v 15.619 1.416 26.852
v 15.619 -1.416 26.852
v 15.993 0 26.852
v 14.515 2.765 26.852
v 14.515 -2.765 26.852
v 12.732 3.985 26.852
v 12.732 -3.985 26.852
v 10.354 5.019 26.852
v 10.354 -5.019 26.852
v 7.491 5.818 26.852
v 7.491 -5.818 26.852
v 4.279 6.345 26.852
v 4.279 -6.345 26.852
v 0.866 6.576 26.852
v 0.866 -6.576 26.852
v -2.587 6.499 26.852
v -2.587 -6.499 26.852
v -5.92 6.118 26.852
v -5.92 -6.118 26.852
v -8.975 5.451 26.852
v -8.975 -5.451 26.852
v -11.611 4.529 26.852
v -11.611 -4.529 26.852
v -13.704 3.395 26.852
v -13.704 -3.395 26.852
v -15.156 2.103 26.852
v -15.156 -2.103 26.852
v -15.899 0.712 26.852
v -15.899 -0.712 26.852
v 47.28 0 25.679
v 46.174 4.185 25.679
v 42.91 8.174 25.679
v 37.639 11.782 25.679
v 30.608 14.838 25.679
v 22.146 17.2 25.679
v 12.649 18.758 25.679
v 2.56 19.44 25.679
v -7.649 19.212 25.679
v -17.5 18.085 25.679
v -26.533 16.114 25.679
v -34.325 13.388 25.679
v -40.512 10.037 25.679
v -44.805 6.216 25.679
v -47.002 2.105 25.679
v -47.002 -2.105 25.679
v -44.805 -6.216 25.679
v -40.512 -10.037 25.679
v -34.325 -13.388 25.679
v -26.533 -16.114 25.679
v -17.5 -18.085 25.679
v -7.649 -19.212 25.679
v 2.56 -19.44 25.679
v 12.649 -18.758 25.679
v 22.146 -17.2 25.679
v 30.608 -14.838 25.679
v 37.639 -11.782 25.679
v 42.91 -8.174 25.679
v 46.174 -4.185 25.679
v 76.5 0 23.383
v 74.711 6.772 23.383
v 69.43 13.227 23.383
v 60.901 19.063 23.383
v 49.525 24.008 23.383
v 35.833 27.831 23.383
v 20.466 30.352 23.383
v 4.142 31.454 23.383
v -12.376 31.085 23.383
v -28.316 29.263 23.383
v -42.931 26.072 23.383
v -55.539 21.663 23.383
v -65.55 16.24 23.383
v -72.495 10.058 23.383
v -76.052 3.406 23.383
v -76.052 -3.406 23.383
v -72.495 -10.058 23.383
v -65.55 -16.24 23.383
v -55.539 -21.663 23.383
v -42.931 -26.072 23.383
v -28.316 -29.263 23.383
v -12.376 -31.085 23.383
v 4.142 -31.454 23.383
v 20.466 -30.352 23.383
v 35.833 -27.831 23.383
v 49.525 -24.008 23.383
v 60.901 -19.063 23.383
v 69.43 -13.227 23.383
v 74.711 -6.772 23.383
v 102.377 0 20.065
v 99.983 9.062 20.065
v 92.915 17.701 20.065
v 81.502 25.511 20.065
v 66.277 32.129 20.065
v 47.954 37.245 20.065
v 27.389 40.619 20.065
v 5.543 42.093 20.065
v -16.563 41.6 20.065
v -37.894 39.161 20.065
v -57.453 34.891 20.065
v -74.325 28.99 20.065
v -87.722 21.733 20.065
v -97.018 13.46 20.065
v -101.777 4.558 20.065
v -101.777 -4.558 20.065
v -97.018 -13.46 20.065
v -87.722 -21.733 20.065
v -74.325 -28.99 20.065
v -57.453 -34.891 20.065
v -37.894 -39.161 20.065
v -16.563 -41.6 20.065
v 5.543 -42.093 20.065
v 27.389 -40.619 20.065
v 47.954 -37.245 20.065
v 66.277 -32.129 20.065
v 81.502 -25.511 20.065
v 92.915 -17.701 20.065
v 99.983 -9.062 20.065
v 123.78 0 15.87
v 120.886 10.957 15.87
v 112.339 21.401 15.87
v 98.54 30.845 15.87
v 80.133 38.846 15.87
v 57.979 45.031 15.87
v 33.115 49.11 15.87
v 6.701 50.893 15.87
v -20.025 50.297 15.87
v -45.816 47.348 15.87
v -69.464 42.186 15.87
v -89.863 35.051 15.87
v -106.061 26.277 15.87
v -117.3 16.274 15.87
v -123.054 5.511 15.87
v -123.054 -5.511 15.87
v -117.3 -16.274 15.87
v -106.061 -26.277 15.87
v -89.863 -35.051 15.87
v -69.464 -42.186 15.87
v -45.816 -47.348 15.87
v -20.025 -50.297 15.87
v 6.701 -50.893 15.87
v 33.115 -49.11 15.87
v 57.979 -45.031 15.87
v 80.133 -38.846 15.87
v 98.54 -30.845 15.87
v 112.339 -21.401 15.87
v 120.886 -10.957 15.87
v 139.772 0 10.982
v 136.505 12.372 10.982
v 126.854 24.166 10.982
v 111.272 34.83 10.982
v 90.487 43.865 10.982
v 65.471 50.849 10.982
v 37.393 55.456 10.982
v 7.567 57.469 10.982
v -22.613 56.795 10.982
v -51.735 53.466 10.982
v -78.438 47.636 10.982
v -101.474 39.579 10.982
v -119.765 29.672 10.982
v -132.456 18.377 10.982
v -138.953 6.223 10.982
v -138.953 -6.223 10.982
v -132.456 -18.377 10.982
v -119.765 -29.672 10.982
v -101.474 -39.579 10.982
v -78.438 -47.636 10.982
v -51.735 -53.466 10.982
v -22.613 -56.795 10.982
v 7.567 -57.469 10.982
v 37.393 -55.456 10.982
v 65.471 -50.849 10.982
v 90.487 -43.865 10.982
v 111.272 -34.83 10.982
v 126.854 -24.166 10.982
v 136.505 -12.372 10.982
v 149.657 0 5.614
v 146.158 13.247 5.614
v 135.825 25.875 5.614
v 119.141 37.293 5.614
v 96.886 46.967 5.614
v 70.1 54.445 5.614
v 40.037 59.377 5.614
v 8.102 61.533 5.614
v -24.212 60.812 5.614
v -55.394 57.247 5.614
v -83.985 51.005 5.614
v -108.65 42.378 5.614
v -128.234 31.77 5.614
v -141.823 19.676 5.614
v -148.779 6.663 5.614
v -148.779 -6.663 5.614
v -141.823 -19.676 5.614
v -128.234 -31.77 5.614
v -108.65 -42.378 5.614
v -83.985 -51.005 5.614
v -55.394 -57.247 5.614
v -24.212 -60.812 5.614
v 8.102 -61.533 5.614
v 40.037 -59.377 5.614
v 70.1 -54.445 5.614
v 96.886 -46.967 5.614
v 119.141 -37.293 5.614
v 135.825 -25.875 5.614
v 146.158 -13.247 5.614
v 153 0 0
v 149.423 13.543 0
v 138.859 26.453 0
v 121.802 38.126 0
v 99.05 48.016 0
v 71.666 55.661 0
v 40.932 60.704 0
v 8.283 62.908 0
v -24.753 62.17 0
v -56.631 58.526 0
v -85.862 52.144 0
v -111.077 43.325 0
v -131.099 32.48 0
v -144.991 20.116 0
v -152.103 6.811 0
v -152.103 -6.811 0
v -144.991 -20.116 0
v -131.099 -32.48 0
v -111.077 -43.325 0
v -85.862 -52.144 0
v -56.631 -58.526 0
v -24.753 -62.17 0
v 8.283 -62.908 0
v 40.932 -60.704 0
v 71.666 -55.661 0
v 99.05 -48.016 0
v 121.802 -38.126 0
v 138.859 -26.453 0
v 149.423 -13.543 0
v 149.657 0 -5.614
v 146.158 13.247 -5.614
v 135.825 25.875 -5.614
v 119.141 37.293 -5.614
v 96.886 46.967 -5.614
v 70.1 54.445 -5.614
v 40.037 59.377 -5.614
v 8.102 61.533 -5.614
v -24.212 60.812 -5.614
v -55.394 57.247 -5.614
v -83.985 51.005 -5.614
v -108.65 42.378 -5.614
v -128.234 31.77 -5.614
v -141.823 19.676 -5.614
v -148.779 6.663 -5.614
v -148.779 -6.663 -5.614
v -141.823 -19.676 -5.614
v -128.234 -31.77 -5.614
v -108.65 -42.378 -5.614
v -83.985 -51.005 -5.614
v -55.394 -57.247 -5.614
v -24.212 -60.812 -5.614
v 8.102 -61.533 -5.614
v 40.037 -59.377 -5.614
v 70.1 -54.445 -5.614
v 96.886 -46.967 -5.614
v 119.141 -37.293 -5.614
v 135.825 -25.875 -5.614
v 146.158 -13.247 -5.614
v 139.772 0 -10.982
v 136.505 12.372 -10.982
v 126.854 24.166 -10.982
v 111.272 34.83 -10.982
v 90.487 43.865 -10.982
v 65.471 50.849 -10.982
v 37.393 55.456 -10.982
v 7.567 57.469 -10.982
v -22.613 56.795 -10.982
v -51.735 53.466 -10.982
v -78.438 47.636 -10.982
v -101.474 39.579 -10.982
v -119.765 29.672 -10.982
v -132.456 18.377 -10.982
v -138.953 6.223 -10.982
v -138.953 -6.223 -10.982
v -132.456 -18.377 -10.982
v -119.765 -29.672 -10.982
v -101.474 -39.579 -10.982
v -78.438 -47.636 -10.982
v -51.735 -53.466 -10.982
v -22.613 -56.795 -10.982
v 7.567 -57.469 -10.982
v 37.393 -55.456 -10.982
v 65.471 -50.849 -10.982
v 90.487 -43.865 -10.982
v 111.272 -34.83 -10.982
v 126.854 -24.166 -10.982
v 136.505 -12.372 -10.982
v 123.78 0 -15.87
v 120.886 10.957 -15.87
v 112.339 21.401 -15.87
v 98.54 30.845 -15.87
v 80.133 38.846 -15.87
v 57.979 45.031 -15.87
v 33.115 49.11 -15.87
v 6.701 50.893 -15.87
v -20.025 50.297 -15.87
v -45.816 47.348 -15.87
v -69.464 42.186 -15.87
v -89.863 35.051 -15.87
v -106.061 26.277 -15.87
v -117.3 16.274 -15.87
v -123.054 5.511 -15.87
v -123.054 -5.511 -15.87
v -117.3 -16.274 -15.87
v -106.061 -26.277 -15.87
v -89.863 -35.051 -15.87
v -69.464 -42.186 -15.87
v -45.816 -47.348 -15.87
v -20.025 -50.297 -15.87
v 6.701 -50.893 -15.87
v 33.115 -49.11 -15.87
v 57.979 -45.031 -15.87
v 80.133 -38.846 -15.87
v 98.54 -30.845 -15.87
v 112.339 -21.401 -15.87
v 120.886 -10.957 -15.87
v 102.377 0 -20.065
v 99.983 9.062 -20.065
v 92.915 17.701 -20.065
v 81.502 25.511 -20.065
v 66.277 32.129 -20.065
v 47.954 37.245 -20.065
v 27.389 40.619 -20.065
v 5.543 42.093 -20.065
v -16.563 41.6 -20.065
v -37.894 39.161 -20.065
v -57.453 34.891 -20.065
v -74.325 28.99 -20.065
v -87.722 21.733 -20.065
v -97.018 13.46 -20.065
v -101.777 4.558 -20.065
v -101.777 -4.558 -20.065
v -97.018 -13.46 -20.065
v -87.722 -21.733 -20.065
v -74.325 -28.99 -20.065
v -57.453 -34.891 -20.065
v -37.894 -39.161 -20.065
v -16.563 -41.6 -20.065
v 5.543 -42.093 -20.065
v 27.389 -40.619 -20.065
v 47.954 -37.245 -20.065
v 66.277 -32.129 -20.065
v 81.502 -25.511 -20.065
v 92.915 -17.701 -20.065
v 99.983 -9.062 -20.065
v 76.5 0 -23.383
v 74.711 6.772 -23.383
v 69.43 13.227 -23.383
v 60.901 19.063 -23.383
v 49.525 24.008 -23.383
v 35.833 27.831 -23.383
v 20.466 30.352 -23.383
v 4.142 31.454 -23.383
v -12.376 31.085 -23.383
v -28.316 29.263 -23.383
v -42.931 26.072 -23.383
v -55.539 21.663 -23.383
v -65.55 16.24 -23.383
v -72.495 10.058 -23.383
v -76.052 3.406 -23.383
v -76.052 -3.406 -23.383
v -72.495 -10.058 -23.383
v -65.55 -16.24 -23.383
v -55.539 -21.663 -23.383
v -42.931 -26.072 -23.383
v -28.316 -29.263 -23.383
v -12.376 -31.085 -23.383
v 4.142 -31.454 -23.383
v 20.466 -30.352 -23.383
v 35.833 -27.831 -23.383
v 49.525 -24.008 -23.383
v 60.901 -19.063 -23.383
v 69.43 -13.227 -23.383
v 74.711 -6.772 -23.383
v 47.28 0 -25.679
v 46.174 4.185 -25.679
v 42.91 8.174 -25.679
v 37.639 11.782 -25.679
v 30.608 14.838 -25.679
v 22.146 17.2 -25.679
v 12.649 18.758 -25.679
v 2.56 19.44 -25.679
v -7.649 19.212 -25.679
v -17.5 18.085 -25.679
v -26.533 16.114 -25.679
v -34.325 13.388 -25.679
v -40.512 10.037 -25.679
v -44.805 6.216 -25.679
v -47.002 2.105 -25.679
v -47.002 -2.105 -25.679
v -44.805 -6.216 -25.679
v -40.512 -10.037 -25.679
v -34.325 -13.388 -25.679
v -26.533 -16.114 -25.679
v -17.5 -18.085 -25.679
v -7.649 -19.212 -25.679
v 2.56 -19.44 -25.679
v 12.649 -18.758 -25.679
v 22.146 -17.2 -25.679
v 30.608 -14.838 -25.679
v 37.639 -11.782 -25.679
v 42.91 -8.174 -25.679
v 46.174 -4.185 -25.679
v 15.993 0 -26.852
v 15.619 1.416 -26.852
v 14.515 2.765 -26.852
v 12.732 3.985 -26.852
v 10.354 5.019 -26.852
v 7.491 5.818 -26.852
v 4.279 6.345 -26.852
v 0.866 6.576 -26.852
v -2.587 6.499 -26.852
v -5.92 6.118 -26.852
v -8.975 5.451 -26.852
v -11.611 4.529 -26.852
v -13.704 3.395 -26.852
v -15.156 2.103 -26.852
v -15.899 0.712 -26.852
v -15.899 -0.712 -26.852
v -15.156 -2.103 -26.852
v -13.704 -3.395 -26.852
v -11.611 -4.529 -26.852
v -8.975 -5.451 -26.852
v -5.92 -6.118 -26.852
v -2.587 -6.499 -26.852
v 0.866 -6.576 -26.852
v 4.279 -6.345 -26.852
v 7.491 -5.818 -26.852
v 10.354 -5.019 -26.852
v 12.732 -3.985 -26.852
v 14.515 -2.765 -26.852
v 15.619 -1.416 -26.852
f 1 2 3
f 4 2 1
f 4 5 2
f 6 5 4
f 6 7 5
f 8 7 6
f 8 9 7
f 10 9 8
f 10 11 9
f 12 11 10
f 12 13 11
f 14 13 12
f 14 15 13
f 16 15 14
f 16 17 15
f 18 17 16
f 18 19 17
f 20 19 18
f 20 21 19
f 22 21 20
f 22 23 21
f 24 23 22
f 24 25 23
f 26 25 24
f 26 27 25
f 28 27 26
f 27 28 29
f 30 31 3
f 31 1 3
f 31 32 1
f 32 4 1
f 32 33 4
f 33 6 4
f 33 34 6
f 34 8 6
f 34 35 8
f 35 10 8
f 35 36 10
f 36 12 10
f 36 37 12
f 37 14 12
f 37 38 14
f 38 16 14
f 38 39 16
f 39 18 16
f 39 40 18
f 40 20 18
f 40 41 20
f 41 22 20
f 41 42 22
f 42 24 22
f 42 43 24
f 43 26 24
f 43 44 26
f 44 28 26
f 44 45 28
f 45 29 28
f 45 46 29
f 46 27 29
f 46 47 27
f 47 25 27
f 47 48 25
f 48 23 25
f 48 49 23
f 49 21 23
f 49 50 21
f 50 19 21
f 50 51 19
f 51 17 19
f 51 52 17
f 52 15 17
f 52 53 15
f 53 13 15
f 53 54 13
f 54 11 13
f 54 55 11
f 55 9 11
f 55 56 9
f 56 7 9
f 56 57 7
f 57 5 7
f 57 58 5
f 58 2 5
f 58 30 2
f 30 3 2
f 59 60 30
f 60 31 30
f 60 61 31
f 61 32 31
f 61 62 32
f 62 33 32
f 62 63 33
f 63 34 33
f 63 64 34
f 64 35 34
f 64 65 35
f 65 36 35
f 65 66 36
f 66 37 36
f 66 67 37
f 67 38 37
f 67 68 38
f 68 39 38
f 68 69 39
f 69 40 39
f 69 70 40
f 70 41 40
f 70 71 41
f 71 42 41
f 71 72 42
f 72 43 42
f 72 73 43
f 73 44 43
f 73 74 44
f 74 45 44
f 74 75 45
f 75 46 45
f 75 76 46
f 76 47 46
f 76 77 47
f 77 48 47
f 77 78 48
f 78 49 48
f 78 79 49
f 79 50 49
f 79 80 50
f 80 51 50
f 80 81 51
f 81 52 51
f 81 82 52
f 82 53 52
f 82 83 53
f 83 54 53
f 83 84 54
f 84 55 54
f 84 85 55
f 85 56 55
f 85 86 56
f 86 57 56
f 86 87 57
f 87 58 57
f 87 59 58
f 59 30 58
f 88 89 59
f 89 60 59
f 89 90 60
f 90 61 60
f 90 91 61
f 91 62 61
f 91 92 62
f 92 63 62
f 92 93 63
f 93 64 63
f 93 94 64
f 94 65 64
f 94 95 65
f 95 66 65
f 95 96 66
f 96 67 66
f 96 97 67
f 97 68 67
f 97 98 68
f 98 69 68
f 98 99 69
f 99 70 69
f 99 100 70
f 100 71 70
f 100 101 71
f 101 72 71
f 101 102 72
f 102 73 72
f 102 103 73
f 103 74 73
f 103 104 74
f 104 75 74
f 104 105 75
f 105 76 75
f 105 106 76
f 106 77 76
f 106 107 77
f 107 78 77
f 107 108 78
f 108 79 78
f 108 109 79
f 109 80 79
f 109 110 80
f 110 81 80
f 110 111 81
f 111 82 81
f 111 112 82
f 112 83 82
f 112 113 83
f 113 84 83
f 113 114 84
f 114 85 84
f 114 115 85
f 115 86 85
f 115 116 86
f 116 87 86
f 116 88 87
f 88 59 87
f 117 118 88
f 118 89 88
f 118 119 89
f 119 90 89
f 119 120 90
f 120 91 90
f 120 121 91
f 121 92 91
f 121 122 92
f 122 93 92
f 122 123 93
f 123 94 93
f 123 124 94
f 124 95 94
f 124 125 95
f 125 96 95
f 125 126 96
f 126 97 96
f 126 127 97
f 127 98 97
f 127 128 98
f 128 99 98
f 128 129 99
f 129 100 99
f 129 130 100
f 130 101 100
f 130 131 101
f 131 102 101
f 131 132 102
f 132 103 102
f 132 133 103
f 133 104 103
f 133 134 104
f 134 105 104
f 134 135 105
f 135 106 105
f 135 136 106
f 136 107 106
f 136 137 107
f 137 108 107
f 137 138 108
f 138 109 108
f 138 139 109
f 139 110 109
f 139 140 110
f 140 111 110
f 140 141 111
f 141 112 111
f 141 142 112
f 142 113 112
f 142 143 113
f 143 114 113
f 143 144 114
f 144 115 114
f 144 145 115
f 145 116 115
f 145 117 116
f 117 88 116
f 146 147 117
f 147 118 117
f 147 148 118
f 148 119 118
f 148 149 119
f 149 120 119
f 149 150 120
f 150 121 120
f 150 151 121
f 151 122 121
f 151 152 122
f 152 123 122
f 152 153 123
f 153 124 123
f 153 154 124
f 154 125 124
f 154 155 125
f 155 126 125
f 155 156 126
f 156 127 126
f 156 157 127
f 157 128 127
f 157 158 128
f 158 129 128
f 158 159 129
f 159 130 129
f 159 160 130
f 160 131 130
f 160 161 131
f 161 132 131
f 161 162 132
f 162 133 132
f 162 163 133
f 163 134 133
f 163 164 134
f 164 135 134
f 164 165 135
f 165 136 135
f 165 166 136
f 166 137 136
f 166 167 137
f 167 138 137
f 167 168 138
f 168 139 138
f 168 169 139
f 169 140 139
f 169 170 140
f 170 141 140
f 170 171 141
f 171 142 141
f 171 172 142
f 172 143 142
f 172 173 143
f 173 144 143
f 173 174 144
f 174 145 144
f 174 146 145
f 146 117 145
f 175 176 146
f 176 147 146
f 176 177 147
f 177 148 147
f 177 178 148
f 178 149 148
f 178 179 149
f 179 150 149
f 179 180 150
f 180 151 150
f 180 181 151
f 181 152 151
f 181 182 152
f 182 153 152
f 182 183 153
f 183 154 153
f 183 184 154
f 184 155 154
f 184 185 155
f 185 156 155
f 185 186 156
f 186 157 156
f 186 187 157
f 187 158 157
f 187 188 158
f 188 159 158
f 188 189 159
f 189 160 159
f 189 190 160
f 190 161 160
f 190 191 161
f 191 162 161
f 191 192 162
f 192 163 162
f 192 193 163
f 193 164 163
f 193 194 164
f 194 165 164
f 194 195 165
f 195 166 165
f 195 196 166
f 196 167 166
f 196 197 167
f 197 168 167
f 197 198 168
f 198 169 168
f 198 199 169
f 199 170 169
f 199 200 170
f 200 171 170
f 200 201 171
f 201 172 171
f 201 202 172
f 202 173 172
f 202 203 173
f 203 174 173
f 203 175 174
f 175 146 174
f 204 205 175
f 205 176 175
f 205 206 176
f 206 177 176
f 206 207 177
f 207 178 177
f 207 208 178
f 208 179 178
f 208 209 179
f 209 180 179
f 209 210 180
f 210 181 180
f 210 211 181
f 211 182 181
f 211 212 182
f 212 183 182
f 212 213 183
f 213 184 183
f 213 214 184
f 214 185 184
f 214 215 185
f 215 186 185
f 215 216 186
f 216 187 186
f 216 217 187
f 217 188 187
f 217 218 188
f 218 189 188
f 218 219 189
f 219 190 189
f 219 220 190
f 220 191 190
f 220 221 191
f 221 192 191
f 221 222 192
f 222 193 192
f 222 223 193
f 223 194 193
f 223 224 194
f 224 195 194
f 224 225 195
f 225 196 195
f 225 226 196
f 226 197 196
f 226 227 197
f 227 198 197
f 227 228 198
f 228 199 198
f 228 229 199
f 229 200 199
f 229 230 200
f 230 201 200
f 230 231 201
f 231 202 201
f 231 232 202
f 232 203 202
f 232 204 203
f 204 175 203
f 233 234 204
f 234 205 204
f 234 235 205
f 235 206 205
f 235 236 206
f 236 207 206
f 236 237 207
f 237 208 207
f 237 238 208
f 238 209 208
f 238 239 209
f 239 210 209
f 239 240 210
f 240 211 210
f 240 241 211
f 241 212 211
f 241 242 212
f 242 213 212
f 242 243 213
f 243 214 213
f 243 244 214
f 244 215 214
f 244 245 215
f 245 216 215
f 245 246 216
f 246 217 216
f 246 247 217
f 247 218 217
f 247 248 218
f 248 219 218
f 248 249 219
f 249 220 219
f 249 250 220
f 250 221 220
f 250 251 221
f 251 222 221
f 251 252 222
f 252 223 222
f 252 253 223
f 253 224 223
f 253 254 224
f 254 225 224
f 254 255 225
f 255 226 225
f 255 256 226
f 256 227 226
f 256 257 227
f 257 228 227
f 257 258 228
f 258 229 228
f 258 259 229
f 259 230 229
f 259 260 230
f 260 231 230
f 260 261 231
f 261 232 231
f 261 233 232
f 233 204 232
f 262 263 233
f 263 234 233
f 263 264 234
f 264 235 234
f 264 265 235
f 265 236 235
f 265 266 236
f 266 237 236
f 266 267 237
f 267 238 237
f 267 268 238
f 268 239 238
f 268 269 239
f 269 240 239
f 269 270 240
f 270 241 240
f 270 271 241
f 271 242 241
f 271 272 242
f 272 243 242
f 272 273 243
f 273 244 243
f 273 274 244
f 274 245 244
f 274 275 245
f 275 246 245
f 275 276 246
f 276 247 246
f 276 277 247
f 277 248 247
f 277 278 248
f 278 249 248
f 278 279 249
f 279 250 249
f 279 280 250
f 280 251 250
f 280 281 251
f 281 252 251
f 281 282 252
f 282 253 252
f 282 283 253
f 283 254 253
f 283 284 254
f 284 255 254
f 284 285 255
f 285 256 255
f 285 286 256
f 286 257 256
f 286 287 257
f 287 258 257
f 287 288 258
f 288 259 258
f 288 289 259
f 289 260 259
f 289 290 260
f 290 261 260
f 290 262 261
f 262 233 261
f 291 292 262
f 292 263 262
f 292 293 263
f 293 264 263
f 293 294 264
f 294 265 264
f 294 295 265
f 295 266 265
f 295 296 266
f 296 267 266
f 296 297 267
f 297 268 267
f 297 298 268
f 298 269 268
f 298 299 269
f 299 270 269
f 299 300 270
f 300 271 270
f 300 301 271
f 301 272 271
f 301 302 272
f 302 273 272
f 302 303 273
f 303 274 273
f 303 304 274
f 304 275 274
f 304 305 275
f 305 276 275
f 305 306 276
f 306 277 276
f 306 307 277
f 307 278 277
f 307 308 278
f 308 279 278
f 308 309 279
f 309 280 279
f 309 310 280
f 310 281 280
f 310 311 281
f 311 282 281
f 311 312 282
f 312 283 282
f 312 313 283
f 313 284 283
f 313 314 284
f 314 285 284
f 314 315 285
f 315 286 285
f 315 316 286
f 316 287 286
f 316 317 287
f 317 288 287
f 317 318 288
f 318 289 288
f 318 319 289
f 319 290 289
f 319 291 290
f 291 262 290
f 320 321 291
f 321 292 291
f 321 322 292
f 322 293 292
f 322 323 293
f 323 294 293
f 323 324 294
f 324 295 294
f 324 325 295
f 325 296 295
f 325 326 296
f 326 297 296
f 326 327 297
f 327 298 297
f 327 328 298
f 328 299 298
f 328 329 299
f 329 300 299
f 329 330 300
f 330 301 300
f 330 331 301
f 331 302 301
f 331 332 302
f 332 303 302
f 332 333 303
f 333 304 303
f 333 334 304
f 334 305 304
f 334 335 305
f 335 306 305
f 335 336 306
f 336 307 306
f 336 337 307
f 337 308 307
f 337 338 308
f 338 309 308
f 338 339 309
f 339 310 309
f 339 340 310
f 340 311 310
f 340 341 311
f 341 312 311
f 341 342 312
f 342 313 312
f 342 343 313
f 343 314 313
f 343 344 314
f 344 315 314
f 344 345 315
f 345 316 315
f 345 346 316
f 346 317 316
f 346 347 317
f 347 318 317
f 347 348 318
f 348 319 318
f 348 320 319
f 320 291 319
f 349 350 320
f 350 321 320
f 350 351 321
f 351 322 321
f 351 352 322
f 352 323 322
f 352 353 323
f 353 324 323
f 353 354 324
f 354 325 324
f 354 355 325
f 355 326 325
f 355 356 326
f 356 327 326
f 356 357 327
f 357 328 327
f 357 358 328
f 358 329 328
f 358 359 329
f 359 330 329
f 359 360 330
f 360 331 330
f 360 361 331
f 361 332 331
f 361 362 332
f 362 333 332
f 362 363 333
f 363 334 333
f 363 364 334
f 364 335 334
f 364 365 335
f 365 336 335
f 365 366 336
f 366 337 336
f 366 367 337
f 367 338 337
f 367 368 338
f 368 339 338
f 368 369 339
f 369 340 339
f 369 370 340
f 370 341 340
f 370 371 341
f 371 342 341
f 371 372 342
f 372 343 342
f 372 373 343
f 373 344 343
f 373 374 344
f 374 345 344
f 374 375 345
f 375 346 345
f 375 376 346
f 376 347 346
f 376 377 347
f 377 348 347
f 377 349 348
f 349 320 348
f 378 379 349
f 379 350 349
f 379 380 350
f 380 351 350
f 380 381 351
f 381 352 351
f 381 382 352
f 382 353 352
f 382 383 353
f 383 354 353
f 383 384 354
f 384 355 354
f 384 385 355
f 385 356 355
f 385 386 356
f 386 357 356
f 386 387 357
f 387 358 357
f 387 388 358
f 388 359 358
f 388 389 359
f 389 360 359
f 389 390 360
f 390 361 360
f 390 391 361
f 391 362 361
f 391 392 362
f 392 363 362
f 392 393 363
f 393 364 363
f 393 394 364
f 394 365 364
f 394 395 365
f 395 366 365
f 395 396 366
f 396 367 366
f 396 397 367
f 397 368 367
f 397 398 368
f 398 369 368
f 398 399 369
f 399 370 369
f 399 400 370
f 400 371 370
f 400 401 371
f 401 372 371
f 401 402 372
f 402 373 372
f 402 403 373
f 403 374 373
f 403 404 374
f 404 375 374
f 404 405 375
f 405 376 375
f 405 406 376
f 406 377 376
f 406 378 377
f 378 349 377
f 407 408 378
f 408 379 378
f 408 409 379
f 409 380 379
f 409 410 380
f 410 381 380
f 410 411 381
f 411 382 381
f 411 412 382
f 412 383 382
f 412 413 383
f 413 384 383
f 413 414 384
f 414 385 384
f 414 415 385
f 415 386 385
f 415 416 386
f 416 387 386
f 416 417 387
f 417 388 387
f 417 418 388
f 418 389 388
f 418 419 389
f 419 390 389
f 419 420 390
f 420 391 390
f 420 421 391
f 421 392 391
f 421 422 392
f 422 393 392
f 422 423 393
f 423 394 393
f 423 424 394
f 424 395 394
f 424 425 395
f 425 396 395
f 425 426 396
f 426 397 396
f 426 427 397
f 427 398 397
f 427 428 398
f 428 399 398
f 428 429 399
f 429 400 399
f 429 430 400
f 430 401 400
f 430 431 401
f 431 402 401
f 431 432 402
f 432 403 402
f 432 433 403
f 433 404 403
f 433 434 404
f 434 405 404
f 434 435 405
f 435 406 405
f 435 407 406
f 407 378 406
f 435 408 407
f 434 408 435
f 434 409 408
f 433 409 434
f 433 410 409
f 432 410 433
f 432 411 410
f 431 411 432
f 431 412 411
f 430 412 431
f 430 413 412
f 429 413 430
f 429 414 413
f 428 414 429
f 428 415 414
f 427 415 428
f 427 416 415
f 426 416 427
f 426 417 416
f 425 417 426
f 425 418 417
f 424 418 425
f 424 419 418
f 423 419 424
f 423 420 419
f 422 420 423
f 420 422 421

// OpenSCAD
// Generated by SolidPython 1.0.1 on 2020-07-29 00:46:52


scale(v = [17, 7, 3]) {
	sphere(r = 9);
}
/***********************************************
*********      SolidPython code:      **********
************************************************
 
# import packages: SolidPython
from solid import *
from solid.utils import *
from itertools import chain, combinations, permutations


class Resize:

    def __init__(self, scad_file):
        self.scad_file = scad_file
        #self.scad_file = import_scad(scad_file)
        # cone/cylinder param:
        self.r1 = 0
        self.r2 = 0
        self.h = 0
        # rectangular prism param:
        self.w = 0
        self.l = 0
        # ellipse param:
        self.r = 0

    # import OpenScad code (file name corresponds to shape)


    # classify shape + parameters
    def assign(self, param1, param2, param3):
        if self.scad_file == 'cone.scad':
            self.r1 = param1
            self.r2 = param2
            self.h = param3
        elif self.scad_file == 'cylinder.scad':
            self.r1 = param1
            self.r2 = param2
            self.h = param3
        elif self.scad_file == 'rectangularPrism.scad':
            self.h = param1
            self.l = param2
            self.w = param3
        else:
            self.r = param1
            self.h = param2

    # resize parameters
    def iterate(self):
        x = range(3, 20, 2)
        i = 1
        if self.scad_file == 'cone.scad':
            tempList = list(permutations(x, 2))
            for temp in tempList:
                param1 = temp[0]
                param2 = temp[1]
                filepath = 'produced_scad_files/' + 'cone' + str(param1) + '_' + str(param2) + '_' + '.scad'
                scad_render_to_file(cylinder(h=param1, r1=param2, r2=0), filepath)

        elif self.scad_file == 'cylinder.scad':
            tempList = list(permutations(x, 3))
            for temp in tempList:
                param1 = temp[0]
                param2 = temp[1]
                filepath = 'produced_scad_files/' + 'cylinder' + str(param1) + '_' + str(param2) + '_' + '.scad'
                scad_render_to_file(cylinder(h=param1, r1=param2, r2=param2), filepath)

        elif self.scad_file == 'rectangularPrism.scad':
            tempList = list(permutations(x, 3))
            for temp in tempList:
                param1 = temp[0]
                param2 = temp[1]
                param3 = temp[2]
                filepath = 'produced_scad_files/' + 'rectangularPrism' + str(param1) + '_' + str(param2) + '_' + str(
                    param3) + '.scad'
                scad_render_to_file(cube(size=(param1, param2, param3)), filepath)

        elif self.scad_file == 'ellipse.scad':
            tempList = list(permutations(x, 4))
            for temp in tempList:
                param1 = temp[0]
                param2 = temp[1]
                param3 = temp[2]
                param4 = temp[3]
                filepath = 'produced_scad_files/' + 'ellipse' + str(param1) + '_' + str(param2) + '_' + str(param3) + '_' + str(param4) + '.scad'
                scad_render_to_file(scale([param1, param2, param3])(sphere(r=param4)), filepath)

    def render_to_scadfile(self):
        scad_render_to_file(scad, 'example.scad') 
 
************************************************/
